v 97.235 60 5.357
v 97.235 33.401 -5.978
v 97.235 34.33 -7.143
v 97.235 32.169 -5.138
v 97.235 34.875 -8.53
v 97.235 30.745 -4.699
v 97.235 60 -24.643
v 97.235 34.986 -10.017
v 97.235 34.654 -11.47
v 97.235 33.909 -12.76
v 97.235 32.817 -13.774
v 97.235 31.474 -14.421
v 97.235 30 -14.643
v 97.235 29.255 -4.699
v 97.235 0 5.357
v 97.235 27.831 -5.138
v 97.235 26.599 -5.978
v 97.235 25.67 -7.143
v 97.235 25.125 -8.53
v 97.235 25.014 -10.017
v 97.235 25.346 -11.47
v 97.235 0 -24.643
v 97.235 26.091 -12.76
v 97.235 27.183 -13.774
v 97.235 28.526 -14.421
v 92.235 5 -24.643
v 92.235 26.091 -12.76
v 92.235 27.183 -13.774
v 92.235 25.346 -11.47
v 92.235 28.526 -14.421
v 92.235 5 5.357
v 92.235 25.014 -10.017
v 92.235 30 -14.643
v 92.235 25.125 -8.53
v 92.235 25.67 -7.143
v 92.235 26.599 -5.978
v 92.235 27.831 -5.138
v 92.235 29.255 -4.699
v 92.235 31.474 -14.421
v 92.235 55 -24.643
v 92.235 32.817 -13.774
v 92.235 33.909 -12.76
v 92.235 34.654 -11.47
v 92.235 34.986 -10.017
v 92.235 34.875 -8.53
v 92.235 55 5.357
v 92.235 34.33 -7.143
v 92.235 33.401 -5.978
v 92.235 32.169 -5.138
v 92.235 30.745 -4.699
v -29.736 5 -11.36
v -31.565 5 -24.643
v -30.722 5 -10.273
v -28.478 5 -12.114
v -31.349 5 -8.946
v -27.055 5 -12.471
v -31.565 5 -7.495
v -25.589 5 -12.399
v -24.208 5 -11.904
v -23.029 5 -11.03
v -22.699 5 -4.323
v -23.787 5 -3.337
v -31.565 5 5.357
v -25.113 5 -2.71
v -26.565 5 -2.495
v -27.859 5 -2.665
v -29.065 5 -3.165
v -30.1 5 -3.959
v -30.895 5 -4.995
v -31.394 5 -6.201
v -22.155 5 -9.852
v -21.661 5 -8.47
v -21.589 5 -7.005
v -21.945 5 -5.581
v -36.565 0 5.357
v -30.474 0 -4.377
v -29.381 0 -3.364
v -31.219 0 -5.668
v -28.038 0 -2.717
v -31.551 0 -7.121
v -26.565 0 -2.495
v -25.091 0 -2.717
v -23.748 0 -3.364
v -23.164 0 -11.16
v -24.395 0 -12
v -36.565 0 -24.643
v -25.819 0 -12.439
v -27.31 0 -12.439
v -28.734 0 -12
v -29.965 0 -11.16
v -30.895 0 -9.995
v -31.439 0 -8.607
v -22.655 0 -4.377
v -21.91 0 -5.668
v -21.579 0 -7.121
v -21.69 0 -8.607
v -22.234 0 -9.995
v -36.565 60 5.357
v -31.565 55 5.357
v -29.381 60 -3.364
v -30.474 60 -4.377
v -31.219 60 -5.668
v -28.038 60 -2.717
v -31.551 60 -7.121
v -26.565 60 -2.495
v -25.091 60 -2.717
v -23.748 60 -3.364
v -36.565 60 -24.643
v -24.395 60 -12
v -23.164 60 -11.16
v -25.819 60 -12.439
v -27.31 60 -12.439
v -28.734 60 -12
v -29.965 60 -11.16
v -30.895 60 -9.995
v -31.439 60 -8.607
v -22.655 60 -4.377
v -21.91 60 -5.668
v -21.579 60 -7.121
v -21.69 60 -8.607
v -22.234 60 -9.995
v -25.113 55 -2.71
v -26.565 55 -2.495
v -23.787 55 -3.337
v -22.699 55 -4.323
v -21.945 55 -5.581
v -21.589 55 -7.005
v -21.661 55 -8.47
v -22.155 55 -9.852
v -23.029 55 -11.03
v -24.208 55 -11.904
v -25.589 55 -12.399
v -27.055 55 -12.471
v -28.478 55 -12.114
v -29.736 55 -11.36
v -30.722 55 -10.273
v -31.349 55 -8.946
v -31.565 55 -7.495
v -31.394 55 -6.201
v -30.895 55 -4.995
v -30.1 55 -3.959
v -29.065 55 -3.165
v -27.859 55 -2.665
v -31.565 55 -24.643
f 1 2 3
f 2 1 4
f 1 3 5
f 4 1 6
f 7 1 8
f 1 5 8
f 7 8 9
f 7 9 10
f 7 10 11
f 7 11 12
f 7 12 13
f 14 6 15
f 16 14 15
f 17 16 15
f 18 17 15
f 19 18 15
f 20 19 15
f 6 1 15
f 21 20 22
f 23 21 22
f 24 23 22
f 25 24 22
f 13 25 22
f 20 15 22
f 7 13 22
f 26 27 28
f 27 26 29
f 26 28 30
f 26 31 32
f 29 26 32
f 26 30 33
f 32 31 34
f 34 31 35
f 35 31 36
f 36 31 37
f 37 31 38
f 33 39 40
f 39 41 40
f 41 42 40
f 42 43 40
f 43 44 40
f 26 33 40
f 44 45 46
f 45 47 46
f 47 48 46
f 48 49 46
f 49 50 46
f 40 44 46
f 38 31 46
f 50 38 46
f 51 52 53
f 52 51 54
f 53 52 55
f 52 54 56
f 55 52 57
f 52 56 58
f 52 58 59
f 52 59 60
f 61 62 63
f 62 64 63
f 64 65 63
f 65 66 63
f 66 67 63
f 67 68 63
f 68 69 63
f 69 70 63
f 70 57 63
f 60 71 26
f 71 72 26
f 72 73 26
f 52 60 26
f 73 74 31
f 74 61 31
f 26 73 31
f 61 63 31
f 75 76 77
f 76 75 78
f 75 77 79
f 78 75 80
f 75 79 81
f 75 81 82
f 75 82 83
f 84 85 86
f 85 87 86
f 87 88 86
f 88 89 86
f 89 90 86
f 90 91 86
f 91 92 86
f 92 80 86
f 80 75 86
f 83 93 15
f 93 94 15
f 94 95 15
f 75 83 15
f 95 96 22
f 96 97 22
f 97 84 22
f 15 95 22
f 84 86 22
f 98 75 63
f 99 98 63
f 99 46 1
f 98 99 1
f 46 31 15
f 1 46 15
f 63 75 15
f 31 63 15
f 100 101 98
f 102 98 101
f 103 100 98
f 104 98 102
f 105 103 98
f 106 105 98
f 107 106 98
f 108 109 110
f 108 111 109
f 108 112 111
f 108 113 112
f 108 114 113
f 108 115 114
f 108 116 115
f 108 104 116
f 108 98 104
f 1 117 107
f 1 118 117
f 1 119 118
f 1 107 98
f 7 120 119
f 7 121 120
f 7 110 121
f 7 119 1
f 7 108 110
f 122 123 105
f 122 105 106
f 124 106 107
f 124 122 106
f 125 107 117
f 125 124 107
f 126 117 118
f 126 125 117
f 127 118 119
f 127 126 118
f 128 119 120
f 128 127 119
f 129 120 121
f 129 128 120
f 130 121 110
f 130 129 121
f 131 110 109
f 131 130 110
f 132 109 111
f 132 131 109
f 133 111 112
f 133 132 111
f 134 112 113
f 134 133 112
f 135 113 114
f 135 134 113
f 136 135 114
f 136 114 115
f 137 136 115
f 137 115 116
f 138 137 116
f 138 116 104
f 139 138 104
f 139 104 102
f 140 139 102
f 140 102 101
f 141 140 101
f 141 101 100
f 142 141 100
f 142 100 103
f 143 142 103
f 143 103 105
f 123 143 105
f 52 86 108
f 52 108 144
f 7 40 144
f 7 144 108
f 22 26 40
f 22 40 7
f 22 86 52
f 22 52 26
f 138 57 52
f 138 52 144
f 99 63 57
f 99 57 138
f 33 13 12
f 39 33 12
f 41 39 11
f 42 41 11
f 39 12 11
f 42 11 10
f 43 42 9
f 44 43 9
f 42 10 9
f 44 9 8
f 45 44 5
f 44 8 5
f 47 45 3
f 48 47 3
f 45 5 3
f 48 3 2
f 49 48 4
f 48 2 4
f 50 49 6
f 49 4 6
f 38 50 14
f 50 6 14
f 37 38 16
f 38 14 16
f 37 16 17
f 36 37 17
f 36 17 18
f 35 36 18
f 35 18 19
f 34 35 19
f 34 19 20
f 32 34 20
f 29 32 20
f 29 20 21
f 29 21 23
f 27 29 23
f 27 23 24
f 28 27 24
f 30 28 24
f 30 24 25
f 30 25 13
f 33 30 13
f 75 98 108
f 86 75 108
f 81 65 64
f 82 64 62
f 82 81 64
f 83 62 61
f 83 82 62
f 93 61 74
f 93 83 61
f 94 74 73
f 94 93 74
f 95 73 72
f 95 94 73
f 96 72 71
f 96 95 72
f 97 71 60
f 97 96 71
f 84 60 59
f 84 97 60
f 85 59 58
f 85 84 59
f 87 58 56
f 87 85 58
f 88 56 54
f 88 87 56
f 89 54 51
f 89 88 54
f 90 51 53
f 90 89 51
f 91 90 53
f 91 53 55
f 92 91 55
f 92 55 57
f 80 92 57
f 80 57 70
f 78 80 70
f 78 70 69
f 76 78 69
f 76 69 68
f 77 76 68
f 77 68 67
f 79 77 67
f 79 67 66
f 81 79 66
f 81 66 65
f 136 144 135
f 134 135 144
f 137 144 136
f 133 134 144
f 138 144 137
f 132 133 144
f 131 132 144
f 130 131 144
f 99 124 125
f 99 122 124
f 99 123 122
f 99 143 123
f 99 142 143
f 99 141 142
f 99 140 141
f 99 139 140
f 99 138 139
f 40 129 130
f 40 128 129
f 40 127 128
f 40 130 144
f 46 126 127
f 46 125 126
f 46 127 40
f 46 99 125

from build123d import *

# Parameters (mm, degrees)
CROQUIS1_W              = 133.8
CROQUIS1_H              = 30
CROQUIS1_R              = 5
SALIENTE_EXTRUIR1_DEPTH = 60
CROQUIS2_W              = 123.8
CROQUIS2_H              = 50
CORTAR_EXTRUIR1_DEPTH   = 119.130169906
CROQUIS3_R              = 5
CORTAR_EXTRUIR2_DEPTH   = 10


with BuildPart() as part:
    # Croquis1 → Saliente-Extruir1 (new body)
    with BuildSketch(Plane(origin=(0, 0, 0), x_dir=(1, 0, 0), z_dir=(0, 1, 0))):
        with Locations((30.335472139, 9.642857143)):
            Rectangle(CROQUIS1_W, CROQUIS1_H)
        with Locations((-26.564527861, 7.494831092)):
            Circle(CROQUIS1_R, mode=Mode.SUBTRACT)
    extrude(amount=SALIENTE_EXTRUIR1_DEPTH)

    # Croquis2 → Cortar-Extruir1 (cut, through all)
    with BuildSketch(Plane.XY.offset(5.357142857)):
        with Locations((30.335472139, 30)):
            Rectangle(CROQUIS2_W, CROQUIS2_H)
    extrude(amount=-CORTAR_EXTRUIR1_DEPTH, mode=Mode.SUBTRACT)

    # Croquis3 → Cortar-Extruir2 (cut)
    with BuildSketch(Plane(origin=(97.235472139, 0, 0), x_dir=(0, 0, -1), z_dir=(1, 0, 0))):
        with Locations((9.642857143, 30)):
            Circle(CROQUIS3_R)
    extrude(amount=-CORTAR_EXTRUIR2_DEPTH, mode=Mode.SUBTRACT)


solid = part.part
